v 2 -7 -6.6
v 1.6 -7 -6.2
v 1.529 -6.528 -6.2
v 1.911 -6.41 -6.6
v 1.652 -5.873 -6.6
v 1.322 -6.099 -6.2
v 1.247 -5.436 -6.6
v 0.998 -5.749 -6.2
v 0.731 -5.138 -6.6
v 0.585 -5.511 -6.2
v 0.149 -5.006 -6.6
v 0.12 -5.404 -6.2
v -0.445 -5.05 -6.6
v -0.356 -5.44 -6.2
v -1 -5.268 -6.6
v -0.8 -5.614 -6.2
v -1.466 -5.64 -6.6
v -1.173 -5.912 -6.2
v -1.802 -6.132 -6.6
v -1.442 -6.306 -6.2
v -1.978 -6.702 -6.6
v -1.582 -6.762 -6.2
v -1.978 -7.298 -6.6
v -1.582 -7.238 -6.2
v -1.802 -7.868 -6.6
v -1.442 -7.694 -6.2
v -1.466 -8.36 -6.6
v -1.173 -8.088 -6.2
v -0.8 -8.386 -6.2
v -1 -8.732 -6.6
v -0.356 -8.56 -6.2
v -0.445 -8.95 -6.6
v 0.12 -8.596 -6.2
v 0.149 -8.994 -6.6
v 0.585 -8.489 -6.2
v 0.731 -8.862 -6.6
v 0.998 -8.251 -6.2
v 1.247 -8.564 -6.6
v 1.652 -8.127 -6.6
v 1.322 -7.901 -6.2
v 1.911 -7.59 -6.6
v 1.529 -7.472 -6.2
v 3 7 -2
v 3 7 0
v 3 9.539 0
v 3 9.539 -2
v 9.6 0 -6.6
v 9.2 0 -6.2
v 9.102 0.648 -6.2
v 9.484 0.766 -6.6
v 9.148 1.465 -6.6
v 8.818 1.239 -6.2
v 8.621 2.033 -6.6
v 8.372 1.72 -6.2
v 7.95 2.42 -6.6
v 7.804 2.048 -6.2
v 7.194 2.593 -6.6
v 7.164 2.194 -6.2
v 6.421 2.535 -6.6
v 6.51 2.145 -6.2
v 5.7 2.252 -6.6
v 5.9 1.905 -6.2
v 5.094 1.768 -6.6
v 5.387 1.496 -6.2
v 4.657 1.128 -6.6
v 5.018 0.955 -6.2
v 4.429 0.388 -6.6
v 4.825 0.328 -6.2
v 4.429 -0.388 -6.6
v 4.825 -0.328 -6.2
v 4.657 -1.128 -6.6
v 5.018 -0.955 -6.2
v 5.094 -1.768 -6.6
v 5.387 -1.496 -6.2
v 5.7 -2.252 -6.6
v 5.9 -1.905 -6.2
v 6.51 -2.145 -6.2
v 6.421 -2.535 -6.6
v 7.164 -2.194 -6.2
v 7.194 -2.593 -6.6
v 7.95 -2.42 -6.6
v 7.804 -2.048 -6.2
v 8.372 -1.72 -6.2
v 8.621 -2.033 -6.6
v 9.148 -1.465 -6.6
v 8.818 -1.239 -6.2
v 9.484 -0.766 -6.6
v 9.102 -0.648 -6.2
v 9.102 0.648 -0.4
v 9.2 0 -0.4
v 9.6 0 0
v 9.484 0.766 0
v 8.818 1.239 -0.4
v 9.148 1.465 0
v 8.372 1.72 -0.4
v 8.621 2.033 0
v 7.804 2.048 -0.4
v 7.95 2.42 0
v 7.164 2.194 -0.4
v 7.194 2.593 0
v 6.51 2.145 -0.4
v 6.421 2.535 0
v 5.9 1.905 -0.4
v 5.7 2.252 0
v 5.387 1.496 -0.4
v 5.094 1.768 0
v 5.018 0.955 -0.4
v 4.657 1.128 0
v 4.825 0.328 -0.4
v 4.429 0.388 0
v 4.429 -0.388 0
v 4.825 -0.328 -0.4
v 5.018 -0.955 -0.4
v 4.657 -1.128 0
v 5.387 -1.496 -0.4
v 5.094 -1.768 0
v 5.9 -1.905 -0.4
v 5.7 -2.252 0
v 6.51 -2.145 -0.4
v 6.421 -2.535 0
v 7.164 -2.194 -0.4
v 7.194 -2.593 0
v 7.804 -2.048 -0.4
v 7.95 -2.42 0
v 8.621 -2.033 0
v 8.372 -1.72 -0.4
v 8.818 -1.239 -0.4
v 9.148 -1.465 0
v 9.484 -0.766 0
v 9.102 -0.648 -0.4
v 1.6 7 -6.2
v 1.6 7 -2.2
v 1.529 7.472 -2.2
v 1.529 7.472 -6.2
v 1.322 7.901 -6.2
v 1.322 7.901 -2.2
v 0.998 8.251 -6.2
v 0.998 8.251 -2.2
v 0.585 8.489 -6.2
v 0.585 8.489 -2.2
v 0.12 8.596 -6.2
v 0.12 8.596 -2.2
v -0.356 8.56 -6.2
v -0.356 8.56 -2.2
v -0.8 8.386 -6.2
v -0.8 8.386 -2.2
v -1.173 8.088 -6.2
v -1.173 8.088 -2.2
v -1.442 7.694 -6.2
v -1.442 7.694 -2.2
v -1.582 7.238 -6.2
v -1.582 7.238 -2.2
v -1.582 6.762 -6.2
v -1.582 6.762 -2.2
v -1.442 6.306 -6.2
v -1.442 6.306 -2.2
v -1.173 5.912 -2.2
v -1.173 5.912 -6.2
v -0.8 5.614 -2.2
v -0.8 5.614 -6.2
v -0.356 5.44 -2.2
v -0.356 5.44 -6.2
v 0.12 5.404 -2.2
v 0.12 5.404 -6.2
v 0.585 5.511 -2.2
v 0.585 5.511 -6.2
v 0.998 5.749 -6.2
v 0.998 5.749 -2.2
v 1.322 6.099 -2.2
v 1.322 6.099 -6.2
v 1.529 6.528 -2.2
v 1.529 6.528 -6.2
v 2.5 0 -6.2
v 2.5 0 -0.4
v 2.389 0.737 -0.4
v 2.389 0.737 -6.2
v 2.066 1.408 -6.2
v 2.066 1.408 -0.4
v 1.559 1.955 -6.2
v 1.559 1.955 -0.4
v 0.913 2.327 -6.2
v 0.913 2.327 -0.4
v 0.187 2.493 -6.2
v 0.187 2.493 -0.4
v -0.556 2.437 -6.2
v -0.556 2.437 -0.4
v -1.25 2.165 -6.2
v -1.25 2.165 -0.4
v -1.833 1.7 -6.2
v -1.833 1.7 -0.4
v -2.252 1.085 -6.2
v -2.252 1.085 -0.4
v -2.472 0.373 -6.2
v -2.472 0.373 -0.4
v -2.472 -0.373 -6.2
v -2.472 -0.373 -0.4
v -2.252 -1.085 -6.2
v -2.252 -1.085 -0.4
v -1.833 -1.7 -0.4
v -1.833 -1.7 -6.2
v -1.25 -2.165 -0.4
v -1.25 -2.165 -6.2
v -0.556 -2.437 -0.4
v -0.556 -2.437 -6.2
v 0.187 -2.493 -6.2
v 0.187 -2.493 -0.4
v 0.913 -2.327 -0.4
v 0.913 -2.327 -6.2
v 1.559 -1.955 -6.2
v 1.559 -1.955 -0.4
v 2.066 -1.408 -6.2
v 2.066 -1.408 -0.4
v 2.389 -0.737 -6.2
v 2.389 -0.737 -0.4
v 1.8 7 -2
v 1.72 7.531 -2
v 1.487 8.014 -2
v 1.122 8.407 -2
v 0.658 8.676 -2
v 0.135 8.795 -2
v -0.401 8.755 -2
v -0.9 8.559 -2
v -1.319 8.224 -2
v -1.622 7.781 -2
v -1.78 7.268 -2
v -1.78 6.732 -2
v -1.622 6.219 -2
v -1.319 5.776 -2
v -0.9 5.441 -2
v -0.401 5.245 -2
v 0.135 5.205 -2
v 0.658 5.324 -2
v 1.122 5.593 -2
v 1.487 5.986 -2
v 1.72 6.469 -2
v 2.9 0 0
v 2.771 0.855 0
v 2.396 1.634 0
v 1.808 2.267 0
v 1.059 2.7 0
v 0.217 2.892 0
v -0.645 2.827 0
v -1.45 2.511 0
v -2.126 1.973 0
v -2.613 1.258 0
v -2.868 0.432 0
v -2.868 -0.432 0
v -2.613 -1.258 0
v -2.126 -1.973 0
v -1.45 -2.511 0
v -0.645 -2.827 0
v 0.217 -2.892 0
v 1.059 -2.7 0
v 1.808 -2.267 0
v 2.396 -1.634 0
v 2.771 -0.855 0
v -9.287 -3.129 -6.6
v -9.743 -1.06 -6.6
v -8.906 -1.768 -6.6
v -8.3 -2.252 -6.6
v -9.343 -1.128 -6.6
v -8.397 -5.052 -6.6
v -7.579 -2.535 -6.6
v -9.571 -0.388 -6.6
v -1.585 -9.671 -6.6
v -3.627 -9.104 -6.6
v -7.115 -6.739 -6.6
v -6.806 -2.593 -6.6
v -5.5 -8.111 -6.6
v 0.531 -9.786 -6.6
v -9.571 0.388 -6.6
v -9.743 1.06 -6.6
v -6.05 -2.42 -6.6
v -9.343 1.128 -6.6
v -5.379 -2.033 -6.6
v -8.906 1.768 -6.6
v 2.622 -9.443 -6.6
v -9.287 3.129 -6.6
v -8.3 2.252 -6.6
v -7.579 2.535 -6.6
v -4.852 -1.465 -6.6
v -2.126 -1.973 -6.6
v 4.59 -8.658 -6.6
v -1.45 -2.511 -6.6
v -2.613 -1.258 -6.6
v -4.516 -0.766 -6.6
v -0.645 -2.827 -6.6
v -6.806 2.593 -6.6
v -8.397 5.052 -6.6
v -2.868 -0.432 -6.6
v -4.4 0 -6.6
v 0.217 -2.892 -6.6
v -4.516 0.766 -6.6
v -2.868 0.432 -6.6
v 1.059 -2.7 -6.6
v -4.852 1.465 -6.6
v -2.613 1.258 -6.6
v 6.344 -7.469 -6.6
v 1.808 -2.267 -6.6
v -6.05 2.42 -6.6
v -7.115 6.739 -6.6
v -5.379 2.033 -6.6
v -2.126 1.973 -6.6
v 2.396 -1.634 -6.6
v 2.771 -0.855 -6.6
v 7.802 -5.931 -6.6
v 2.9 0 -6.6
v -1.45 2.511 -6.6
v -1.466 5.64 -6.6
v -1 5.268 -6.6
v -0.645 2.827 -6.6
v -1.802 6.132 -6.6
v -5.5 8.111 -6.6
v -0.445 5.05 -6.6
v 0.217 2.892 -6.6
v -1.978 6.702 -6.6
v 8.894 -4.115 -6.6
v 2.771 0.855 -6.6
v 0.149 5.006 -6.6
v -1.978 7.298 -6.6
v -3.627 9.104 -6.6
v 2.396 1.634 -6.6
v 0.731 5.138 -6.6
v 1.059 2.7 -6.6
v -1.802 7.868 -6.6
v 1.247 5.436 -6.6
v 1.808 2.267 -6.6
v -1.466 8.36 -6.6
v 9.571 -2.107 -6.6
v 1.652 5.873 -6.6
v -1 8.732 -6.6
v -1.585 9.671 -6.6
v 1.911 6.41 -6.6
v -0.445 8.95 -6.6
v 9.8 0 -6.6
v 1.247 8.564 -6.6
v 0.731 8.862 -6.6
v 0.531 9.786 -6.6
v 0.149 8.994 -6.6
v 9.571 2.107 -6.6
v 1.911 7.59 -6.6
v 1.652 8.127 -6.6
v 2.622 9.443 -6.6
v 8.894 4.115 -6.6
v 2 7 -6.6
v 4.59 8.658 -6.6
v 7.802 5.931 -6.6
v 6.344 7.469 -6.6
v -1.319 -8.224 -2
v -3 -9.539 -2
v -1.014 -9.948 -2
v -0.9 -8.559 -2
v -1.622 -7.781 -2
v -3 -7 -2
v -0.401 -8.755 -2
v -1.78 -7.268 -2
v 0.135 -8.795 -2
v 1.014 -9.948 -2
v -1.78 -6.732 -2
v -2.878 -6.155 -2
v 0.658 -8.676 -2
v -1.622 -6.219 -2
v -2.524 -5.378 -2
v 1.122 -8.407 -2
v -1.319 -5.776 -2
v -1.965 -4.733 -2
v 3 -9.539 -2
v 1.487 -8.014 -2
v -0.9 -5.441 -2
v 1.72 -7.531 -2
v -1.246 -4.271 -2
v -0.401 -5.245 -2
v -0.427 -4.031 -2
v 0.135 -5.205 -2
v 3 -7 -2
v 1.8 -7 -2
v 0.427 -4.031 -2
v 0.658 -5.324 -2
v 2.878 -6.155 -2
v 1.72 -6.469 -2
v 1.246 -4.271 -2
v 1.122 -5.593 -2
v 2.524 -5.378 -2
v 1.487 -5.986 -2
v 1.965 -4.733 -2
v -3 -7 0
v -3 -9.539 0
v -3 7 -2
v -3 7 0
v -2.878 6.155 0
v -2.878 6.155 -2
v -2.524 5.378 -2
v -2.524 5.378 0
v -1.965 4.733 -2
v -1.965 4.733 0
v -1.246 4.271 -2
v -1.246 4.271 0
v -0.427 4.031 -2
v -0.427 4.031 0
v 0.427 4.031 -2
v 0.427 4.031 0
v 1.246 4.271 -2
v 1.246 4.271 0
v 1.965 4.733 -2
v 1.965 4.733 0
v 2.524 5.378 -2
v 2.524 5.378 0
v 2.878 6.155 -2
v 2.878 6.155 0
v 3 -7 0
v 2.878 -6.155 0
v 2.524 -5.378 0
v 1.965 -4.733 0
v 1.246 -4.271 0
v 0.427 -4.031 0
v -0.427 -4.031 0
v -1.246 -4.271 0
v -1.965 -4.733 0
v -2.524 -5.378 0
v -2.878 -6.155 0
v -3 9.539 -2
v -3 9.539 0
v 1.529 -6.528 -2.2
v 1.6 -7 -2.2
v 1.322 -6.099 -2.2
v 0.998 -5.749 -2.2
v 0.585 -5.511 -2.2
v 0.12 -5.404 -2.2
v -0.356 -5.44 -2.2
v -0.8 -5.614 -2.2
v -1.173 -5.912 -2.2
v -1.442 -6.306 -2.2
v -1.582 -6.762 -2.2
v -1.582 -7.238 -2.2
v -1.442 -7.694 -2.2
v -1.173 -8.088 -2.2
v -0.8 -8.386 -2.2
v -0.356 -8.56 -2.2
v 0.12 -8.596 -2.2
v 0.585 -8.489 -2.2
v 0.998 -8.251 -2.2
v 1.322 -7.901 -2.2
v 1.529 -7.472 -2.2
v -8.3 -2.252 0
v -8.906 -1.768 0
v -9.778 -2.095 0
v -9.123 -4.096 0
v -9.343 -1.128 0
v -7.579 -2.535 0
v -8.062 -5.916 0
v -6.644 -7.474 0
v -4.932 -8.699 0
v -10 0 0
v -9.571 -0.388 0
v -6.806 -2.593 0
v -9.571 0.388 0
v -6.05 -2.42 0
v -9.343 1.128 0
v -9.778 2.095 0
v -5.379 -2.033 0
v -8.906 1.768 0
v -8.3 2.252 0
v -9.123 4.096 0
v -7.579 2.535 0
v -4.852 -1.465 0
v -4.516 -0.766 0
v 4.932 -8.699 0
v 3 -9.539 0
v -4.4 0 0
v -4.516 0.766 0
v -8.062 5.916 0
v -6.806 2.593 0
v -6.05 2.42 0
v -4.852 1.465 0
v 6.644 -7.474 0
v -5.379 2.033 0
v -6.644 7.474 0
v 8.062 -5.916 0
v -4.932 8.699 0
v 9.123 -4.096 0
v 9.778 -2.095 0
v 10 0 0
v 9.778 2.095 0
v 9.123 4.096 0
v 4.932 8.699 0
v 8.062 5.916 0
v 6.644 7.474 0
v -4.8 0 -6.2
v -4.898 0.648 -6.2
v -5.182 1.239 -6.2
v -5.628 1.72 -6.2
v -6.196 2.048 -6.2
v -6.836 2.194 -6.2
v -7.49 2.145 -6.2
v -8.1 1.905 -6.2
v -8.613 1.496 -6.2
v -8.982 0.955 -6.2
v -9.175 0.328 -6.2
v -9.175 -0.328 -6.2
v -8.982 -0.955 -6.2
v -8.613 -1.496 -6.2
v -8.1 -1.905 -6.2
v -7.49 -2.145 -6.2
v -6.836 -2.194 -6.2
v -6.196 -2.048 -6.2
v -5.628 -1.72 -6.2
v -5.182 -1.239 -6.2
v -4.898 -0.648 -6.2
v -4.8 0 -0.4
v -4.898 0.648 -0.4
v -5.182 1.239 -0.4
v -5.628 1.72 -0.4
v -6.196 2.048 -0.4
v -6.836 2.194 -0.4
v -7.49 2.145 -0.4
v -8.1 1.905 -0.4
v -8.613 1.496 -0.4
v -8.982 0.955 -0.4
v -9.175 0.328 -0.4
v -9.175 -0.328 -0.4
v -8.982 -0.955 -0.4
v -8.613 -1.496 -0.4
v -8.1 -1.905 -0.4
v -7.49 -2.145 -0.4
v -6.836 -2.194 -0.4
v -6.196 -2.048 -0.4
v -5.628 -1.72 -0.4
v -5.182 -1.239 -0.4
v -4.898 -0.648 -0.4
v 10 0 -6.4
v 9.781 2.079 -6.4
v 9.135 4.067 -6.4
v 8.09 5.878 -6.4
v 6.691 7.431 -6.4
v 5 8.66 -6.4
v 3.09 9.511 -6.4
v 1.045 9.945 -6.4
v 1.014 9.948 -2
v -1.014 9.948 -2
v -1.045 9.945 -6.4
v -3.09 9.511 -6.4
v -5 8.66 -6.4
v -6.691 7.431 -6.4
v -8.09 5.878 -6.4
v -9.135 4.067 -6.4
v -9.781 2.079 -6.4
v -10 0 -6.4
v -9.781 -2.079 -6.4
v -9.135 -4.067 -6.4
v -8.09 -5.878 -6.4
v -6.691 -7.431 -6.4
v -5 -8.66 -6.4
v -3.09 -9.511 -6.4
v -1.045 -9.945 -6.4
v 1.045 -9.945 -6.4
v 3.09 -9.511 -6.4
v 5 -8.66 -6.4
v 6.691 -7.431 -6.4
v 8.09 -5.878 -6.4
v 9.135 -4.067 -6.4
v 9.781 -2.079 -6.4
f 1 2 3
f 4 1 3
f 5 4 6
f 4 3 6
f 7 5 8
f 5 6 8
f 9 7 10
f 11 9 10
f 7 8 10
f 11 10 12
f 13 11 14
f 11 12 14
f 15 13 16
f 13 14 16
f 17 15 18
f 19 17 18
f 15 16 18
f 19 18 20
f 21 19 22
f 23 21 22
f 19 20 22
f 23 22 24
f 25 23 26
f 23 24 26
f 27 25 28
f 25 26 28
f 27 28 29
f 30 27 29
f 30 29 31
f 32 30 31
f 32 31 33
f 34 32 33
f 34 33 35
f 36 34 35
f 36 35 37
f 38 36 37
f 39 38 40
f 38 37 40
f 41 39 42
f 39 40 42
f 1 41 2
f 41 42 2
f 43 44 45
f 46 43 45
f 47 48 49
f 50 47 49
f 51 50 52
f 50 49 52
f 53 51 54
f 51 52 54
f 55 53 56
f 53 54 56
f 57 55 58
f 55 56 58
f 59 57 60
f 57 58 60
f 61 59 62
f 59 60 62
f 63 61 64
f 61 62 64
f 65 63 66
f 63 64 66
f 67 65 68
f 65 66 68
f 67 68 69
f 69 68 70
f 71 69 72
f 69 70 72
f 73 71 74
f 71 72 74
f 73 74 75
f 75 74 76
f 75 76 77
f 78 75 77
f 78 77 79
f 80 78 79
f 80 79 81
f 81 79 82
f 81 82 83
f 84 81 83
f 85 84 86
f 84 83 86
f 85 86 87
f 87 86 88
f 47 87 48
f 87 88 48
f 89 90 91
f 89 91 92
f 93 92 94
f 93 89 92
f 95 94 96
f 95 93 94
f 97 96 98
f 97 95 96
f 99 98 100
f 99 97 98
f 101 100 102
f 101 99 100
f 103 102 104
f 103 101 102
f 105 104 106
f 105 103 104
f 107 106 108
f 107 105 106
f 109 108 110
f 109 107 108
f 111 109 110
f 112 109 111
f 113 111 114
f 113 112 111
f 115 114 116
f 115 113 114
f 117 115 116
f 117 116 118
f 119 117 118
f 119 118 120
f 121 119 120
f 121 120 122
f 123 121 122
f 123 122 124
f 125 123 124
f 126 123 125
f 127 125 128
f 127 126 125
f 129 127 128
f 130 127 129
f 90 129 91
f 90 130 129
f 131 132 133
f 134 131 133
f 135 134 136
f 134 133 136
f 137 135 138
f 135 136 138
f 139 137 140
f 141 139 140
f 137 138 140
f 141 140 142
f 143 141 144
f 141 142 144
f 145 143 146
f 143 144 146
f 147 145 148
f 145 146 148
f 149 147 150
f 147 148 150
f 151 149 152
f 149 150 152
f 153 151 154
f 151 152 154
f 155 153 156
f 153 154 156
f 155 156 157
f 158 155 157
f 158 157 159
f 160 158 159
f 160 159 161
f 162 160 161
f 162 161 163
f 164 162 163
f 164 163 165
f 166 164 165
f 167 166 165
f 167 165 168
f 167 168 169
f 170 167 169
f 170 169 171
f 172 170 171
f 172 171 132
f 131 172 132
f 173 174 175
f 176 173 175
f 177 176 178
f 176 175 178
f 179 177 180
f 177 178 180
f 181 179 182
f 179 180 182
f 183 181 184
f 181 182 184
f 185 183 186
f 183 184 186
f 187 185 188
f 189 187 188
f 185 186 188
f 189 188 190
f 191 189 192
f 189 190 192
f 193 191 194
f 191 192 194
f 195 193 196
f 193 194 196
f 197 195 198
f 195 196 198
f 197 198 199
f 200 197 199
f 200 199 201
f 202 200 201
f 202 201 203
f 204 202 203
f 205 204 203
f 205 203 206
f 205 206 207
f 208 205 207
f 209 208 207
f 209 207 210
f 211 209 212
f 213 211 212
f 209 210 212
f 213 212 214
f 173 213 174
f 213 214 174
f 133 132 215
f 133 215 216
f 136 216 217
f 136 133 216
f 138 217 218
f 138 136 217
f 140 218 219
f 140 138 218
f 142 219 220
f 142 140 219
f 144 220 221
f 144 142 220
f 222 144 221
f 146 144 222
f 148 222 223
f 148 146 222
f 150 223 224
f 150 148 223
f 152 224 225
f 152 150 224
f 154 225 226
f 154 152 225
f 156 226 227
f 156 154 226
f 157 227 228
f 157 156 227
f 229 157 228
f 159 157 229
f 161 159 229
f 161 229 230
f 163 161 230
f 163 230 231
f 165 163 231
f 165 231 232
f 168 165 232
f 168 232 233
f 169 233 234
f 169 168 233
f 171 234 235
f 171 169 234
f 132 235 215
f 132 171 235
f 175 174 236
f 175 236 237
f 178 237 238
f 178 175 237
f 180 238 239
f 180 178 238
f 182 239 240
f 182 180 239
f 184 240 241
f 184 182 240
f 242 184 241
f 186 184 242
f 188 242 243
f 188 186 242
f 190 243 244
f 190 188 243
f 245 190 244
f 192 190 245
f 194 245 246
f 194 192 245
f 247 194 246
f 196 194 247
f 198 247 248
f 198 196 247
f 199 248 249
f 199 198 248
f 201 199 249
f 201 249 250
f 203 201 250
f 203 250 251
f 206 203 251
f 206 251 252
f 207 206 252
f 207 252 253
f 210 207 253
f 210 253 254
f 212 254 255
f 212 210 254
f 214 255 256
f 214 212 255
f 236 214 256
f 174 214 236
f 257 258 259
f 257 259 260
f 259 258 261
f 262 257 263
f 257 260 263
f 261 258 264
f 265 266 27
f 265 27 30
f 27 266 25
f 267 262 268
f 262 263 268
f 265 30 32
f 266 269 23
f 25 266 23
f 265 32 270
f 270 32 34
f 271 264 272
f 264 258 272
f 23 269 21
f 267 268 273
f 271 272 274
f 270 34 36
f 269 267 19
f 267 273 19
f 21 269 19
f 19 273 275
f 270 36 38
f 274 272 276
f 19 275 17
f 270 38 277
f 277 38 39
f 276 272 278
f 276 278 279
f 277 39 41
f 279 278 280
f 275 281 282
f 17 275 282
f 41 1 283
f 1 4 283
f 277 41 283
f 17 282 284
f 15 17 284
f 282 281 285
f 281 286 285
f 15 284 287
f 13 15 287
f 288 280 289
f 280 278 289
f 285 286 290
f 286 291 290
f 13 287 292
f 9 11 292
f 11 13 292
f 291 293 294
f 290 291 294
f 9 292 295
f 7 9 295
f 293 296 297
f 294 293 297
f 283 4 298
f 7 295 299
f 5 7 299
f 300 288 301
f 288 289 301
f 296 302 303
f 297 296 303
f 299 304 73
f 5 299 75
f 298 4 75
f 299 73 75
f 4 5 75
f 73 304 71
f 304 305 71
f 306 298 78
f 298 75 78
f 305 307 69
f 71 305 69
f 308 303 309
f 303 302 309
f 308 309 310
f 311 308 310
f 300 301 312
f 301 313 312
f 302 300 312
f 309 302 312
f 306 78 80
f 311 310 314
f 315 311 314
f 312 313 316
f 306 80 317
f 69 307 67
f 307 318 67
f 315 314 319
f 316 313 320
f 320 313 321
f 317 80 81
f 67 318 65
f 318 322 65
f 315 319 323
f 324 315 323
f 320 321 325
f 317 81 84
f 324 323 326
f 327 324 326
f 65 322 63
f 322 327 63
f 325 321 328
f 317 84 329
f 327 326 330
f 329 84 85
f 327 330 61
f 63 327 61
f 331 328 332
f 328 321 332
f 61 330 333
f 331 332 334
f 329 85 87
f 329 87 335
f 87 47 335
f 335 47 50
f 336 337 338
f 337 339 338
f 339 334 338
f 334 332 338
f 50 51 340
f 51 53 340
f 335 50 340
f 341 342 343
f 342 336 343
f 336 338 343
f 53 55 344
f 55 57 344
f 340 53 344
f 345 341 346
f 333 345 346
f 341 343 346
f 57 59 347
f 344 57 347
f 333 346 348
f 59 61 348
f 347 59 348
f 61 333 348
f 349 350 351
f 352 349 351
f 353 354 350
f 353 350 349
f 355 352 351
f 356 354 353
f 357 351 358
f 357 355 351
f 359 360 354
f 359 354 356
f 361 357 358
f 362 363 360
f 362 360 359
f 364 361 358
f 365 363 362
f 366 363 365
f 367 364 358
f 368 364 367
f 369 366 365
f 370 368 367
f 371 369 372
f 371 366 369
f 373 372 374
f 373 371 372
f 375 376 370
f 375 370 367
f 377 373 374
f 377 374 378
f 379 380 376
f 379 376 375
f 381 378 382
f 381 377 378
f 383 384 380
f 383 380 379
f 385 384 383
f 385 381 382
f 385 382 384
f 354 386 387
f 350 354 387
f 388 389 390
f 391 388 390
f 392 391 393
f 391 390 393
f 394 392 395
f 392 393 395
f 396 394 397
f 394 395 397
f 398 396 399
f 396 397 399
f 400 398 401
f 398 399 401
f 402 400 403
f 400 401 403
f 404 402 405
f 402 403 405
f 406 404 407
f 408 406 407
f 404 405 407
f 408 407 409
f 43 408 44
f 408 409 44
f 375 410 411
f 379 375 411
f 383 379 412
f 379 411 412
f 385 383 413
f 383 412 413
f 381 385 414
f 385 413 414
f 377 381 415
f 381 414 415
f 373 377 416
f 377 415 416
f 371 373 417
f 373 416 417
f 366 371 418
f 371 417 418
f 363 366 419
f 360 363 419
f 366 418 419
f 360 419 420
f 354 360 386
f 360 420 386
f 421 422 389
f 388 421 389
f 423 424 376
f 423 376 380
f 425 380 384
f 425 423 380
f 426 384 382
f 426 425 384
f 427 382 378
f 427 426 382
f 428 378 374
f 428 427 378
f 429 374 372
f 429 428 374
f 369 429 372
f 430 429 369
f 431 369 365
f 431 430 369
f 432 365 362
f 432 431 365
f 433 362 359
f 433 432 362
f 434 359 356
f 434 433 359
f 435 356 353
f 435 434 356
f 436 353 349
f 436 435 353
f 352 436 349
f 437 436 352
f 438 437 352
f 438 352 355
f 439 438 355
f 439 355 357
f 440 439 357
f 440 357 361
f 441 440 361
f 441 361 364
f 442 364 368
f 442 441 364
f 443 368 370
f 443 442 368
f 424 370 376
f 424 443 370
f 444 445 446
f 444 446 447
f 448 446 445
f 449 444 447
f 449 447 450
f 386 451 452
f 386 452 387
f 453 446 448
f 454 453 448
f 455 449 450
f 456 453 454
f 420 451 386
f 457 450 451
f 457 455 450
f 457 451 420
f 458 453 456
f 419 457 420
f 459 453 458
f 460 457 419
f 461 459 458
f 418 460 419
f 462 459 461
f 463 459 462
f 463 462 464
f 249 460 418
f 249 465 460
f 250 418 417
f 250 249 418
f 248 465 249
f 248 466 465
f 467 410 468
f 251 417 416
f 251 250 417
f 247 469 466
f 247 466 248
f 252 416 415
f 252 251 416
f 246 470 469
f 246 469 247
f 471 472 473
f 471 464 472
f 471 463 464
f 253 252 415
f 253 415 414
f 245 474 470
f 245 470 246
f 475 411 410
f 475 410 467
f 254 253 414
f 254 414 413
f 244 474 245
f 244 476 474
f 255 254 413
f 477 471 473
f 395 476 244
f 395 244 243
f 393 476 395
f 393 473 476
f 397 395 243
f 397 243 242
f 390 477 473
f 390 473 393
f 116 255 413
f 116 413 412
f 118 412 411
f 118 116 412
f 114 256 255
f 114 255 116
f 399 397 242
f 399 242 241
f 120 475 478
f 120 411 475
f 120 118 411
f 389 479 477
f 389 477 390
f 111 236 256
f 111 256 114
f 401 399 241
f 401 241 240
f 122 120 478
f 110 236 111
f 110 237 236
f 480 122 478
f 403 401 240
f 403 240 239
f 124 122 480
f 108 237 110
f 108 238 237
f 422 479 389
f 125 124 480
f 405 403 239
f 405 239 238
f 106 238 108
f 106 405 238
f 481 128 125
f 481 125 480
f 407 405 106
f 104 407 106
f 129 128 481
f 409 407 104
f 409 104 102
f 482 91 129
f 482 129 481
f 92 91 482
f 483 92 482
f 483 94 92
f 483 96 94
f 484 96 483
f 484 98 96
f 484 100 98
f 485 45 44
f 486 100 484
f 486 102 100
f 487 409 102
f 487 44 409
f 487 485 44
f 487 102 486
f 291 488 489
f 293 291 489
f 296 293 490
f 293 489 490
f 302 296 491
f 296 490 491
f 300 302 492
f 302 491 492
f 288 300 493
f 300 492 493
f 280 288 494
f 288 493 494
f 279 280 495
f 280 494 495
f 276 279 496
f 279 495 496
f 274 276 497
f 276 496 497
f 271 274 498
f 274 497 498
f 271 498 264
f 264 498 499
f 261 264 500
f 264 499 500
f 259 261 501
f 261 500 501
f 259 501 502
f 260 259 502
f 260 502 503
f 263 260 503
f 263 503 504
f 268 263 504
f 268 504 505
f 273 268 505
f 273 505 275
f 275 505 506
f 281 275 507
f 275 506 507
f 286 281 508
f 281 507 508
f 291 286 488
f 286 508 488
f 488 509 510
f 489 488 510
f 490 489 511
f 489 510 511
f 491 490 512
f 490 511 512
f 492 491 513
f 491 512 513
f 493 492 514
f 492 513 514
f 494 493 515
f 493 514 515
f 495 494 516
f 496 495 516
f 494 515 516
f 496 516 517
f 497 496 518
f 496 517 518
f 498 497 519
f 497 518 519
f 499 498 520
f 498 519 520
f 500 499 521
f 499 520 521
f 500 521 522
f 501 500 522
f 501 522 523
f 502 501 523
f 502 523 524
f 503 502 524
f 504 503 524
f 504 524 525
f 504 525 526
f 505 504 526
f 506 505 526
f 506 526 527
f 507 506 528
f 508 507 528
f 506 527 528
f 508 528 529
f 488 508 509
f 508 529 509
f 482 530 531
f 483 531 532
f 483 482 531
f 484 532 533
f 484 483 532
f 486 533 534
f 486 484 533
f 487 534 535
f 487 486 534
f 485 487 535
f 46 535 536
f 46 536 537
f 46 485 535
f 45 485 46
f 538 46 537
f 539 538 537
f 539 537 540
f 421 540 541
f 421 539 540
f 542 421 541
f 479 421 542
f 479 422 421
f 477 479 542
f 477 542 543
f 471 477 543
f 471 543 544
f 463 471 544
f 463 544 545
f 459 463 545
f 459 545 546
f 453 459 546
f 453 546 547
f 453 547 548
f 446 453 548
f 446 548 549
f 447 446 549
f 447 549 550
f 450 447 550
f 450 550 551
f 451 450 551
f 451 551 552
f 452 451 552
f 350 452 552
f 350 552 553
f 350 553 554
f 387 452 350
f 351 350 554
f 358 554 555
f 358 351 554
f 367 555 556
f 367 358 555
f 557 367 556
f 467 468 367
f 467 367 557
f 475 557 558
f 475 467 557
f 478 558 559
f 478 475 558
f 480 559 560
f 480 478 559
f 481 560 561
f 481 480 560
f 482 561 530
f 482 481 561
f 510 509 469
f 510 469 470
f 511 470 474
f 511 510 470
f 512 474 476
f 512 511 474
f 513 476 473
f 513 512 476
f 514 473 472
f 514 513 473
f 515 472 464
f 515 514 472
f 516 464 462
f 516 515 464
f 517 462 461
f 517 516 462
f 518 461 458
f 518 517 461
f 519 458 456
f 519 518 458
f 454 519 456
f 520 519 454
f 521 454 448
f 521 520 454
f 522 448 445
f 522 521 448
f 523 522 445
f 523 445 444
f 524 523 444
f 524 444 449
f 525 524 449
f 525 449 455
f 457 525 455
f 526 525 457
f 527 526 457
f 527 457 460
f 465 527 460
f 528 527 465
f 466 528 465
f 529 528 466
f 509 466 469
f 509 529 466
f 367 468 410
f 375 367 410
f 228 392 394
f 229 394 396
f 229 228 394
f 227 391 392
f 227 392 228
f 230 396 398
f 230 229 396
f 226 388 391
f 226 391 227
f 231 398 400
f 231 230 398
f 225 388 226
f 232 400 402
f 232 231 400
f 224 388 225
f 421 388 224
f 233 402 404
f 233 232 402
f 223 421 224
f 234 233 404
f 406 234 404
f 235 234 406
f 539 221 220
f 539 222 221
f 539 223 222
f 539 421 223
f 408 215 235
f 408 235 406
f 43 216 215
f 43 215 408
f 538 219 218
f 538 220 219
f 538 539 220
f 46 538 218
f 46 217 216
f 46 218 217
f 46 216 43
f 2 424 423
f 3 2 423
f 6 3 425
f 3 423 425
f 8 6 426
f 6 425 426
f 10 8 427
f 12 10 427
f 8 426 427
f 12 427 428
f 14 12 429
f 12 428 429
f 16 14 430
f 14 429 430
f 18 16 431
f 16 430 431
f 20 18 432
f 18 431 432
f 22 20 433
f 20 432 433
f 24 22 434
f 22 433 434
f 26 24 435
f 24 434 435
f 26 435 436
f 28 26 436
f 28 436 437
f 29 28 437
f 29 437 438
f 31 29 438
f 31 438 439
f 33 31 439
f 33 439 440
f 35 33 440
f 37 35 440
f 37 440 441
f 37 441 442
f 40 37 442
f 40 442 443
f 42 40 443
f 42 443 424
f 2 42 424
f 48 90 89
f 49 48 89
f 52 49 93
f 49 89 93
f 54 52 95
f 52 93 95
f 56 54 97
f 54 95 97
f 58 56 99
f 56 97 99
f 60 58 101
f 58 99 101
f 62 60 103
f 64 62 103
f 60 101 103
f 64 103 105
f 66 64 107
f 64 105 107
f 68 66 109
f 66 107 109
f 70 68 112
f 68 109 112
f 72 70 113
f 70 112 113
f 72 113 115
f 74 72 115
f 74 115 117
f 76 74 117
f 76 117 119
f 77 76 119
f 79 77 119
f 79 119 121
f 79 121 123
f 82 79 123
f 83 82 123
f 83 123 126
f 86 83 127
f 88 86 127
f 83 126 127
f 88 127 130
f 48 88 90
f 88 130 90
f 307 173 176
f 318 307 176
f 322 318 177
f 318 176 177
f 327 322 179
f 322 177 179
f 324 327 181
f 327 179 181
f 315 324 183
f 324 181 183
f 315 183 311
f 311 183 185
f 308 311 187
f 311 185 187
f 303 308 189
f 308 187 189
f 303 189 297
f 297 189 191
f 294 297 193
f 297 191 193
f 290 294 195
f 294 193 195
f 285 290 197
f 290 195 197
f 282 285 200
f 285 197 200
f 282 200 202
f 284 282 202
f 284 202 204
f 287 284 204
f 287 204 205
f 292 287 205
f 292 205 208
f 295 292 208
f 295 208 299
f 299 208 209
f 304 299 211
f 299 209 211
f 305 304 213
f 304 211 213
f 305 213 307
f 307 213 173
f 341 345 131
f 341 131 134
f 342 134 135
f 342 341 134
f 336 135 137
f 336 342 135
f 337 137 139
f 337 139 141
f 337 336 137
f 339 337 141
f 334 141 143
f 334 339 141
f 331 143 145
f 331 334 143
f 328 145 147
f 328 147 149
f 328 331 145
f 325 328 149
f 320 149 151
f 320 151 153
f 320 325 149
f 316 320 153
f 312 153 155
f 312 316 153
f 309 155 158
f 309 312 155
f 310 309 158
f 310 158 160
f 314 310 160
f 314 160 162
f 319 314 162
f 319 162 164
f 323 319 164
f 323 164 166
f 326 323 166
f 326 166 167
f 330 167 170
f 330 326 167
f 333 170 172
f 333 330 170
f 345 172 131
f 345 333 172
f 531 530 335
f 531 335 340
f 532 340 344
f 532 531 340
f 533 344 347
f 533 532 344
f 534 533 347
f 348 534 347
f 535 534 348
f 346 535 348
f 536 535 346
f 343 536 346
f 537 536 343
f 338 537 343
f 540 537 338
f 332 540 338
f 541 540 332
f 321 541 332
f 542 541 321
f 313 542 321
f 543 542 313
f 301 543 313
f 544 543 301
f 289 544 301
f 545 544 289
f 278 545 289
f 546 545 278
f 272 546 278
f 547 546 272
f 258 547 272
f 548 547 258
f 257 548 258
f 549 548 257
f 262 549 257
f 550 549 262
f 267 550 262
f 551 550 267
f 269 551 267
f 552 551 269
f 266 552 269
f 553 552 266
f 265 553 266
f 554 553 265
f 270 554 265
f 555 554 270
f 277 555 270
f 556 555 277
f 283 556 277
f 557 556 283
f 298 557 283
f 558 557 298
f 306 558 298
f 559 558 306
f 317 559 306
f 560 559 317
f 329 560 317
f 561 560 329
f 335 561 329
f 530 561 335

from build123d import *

# Parameters (mm, degrees)
SKETCH085_R     = 10
SKETCH085_R_2   = 1.6
SKETCH085_R_3   = 2.2
SKETCH085_R_4   = 2.5
PAD046_DEPTH    = 6.6
POCKET005_DEPTH = 2
CHAMFER002_SIZE = 0.2
CHAMFER003_SIZE = 0.4
CHAMFER004_SIZE = 0.2


with BuildPart() as part:
    # Sketch085 → Pad046 (new body)
    with BuildSketch(Plane.XY):
        Circle(SKETCH085_R)
        with Locations((0, 7)):
            Circle(SKETCH085_R_2, mode=Mode.SUBTRACT)
        with Locations((7, 0)):
            Circle(SKETCH085_R_3, mode=Mode.SUBTRACT)
        with Locations((0, -7)):
            Circle(SKETCH085_R_2, mode=Mode.SUBTRACT)
        with Locations((-7, 0)):
            Circle(SKETCH085_R_3, mode=Mode.SUBTRACT)
        Circle(SKETCH085_R_4, mode=Mode.SUBTRACT)
    extrude(amount=-PAD046_DEPTH)

    # Sketch086 → Pocket005 (cut)
    with BuildSketch(Plane.XY):
        with BuildLine():
            ThreePointArc((-3, 7), (0, 4), (3, 7))
            Line((3, 7), (3, 10))
            ThreePointArc((3, 10), (0, 13), (-3, 10))
            Line((-3, 10), (-3, 7))
        make_face()
        with BuildLine():
            ThreePointArc((3, -7), (0, -4), (-3, -7))
            Line((-3, -7), (-3, -10))
            ThreePointArc((-3, -10), (0, -13), (3, -10))
            Line((3, -10), (3, -7))
        make_face()
    extrude(amount=-POCKET005_DEPTH, mode=Mode.SUBTRACT)

    # Chamfer002
    chamfer002_edges = [part.edges().sort_by_distance(p)[0] for p in [
        (-1.6, 7, -2),
        (-1.6, -7, -2),
    ]]
    chamfer(chamfer002_edges, length=CHAMFER002_SIZE)

    # Chamfer003
    chamfer003_edges = [part.edges().sort_by_distance(p)[0] for p in [
        (4.8, 0, 0),
        (-9.2, 0, 0),
        (-2.5, 0, 0),
        (-1.6, 7, -6.6),
        (-2.5, 0, -6.6),
        (4.8, 0, -6.6),
        (-1.6, -7, -6.6),
        (-9.2, 0, -6.6),
    ]]
    chamfer(chamfer003_edges, length=CHAMFER003_SIZE)

    # Chamfer004
    chamfer004_edges = [part.edges().sort_by_distance(p)[0] for p in [
        (-10, 0, -6.6),
    ]]
    chamfer(chamfer004_edges, length=CHAMFER004_SIZE)


solid = part.part
